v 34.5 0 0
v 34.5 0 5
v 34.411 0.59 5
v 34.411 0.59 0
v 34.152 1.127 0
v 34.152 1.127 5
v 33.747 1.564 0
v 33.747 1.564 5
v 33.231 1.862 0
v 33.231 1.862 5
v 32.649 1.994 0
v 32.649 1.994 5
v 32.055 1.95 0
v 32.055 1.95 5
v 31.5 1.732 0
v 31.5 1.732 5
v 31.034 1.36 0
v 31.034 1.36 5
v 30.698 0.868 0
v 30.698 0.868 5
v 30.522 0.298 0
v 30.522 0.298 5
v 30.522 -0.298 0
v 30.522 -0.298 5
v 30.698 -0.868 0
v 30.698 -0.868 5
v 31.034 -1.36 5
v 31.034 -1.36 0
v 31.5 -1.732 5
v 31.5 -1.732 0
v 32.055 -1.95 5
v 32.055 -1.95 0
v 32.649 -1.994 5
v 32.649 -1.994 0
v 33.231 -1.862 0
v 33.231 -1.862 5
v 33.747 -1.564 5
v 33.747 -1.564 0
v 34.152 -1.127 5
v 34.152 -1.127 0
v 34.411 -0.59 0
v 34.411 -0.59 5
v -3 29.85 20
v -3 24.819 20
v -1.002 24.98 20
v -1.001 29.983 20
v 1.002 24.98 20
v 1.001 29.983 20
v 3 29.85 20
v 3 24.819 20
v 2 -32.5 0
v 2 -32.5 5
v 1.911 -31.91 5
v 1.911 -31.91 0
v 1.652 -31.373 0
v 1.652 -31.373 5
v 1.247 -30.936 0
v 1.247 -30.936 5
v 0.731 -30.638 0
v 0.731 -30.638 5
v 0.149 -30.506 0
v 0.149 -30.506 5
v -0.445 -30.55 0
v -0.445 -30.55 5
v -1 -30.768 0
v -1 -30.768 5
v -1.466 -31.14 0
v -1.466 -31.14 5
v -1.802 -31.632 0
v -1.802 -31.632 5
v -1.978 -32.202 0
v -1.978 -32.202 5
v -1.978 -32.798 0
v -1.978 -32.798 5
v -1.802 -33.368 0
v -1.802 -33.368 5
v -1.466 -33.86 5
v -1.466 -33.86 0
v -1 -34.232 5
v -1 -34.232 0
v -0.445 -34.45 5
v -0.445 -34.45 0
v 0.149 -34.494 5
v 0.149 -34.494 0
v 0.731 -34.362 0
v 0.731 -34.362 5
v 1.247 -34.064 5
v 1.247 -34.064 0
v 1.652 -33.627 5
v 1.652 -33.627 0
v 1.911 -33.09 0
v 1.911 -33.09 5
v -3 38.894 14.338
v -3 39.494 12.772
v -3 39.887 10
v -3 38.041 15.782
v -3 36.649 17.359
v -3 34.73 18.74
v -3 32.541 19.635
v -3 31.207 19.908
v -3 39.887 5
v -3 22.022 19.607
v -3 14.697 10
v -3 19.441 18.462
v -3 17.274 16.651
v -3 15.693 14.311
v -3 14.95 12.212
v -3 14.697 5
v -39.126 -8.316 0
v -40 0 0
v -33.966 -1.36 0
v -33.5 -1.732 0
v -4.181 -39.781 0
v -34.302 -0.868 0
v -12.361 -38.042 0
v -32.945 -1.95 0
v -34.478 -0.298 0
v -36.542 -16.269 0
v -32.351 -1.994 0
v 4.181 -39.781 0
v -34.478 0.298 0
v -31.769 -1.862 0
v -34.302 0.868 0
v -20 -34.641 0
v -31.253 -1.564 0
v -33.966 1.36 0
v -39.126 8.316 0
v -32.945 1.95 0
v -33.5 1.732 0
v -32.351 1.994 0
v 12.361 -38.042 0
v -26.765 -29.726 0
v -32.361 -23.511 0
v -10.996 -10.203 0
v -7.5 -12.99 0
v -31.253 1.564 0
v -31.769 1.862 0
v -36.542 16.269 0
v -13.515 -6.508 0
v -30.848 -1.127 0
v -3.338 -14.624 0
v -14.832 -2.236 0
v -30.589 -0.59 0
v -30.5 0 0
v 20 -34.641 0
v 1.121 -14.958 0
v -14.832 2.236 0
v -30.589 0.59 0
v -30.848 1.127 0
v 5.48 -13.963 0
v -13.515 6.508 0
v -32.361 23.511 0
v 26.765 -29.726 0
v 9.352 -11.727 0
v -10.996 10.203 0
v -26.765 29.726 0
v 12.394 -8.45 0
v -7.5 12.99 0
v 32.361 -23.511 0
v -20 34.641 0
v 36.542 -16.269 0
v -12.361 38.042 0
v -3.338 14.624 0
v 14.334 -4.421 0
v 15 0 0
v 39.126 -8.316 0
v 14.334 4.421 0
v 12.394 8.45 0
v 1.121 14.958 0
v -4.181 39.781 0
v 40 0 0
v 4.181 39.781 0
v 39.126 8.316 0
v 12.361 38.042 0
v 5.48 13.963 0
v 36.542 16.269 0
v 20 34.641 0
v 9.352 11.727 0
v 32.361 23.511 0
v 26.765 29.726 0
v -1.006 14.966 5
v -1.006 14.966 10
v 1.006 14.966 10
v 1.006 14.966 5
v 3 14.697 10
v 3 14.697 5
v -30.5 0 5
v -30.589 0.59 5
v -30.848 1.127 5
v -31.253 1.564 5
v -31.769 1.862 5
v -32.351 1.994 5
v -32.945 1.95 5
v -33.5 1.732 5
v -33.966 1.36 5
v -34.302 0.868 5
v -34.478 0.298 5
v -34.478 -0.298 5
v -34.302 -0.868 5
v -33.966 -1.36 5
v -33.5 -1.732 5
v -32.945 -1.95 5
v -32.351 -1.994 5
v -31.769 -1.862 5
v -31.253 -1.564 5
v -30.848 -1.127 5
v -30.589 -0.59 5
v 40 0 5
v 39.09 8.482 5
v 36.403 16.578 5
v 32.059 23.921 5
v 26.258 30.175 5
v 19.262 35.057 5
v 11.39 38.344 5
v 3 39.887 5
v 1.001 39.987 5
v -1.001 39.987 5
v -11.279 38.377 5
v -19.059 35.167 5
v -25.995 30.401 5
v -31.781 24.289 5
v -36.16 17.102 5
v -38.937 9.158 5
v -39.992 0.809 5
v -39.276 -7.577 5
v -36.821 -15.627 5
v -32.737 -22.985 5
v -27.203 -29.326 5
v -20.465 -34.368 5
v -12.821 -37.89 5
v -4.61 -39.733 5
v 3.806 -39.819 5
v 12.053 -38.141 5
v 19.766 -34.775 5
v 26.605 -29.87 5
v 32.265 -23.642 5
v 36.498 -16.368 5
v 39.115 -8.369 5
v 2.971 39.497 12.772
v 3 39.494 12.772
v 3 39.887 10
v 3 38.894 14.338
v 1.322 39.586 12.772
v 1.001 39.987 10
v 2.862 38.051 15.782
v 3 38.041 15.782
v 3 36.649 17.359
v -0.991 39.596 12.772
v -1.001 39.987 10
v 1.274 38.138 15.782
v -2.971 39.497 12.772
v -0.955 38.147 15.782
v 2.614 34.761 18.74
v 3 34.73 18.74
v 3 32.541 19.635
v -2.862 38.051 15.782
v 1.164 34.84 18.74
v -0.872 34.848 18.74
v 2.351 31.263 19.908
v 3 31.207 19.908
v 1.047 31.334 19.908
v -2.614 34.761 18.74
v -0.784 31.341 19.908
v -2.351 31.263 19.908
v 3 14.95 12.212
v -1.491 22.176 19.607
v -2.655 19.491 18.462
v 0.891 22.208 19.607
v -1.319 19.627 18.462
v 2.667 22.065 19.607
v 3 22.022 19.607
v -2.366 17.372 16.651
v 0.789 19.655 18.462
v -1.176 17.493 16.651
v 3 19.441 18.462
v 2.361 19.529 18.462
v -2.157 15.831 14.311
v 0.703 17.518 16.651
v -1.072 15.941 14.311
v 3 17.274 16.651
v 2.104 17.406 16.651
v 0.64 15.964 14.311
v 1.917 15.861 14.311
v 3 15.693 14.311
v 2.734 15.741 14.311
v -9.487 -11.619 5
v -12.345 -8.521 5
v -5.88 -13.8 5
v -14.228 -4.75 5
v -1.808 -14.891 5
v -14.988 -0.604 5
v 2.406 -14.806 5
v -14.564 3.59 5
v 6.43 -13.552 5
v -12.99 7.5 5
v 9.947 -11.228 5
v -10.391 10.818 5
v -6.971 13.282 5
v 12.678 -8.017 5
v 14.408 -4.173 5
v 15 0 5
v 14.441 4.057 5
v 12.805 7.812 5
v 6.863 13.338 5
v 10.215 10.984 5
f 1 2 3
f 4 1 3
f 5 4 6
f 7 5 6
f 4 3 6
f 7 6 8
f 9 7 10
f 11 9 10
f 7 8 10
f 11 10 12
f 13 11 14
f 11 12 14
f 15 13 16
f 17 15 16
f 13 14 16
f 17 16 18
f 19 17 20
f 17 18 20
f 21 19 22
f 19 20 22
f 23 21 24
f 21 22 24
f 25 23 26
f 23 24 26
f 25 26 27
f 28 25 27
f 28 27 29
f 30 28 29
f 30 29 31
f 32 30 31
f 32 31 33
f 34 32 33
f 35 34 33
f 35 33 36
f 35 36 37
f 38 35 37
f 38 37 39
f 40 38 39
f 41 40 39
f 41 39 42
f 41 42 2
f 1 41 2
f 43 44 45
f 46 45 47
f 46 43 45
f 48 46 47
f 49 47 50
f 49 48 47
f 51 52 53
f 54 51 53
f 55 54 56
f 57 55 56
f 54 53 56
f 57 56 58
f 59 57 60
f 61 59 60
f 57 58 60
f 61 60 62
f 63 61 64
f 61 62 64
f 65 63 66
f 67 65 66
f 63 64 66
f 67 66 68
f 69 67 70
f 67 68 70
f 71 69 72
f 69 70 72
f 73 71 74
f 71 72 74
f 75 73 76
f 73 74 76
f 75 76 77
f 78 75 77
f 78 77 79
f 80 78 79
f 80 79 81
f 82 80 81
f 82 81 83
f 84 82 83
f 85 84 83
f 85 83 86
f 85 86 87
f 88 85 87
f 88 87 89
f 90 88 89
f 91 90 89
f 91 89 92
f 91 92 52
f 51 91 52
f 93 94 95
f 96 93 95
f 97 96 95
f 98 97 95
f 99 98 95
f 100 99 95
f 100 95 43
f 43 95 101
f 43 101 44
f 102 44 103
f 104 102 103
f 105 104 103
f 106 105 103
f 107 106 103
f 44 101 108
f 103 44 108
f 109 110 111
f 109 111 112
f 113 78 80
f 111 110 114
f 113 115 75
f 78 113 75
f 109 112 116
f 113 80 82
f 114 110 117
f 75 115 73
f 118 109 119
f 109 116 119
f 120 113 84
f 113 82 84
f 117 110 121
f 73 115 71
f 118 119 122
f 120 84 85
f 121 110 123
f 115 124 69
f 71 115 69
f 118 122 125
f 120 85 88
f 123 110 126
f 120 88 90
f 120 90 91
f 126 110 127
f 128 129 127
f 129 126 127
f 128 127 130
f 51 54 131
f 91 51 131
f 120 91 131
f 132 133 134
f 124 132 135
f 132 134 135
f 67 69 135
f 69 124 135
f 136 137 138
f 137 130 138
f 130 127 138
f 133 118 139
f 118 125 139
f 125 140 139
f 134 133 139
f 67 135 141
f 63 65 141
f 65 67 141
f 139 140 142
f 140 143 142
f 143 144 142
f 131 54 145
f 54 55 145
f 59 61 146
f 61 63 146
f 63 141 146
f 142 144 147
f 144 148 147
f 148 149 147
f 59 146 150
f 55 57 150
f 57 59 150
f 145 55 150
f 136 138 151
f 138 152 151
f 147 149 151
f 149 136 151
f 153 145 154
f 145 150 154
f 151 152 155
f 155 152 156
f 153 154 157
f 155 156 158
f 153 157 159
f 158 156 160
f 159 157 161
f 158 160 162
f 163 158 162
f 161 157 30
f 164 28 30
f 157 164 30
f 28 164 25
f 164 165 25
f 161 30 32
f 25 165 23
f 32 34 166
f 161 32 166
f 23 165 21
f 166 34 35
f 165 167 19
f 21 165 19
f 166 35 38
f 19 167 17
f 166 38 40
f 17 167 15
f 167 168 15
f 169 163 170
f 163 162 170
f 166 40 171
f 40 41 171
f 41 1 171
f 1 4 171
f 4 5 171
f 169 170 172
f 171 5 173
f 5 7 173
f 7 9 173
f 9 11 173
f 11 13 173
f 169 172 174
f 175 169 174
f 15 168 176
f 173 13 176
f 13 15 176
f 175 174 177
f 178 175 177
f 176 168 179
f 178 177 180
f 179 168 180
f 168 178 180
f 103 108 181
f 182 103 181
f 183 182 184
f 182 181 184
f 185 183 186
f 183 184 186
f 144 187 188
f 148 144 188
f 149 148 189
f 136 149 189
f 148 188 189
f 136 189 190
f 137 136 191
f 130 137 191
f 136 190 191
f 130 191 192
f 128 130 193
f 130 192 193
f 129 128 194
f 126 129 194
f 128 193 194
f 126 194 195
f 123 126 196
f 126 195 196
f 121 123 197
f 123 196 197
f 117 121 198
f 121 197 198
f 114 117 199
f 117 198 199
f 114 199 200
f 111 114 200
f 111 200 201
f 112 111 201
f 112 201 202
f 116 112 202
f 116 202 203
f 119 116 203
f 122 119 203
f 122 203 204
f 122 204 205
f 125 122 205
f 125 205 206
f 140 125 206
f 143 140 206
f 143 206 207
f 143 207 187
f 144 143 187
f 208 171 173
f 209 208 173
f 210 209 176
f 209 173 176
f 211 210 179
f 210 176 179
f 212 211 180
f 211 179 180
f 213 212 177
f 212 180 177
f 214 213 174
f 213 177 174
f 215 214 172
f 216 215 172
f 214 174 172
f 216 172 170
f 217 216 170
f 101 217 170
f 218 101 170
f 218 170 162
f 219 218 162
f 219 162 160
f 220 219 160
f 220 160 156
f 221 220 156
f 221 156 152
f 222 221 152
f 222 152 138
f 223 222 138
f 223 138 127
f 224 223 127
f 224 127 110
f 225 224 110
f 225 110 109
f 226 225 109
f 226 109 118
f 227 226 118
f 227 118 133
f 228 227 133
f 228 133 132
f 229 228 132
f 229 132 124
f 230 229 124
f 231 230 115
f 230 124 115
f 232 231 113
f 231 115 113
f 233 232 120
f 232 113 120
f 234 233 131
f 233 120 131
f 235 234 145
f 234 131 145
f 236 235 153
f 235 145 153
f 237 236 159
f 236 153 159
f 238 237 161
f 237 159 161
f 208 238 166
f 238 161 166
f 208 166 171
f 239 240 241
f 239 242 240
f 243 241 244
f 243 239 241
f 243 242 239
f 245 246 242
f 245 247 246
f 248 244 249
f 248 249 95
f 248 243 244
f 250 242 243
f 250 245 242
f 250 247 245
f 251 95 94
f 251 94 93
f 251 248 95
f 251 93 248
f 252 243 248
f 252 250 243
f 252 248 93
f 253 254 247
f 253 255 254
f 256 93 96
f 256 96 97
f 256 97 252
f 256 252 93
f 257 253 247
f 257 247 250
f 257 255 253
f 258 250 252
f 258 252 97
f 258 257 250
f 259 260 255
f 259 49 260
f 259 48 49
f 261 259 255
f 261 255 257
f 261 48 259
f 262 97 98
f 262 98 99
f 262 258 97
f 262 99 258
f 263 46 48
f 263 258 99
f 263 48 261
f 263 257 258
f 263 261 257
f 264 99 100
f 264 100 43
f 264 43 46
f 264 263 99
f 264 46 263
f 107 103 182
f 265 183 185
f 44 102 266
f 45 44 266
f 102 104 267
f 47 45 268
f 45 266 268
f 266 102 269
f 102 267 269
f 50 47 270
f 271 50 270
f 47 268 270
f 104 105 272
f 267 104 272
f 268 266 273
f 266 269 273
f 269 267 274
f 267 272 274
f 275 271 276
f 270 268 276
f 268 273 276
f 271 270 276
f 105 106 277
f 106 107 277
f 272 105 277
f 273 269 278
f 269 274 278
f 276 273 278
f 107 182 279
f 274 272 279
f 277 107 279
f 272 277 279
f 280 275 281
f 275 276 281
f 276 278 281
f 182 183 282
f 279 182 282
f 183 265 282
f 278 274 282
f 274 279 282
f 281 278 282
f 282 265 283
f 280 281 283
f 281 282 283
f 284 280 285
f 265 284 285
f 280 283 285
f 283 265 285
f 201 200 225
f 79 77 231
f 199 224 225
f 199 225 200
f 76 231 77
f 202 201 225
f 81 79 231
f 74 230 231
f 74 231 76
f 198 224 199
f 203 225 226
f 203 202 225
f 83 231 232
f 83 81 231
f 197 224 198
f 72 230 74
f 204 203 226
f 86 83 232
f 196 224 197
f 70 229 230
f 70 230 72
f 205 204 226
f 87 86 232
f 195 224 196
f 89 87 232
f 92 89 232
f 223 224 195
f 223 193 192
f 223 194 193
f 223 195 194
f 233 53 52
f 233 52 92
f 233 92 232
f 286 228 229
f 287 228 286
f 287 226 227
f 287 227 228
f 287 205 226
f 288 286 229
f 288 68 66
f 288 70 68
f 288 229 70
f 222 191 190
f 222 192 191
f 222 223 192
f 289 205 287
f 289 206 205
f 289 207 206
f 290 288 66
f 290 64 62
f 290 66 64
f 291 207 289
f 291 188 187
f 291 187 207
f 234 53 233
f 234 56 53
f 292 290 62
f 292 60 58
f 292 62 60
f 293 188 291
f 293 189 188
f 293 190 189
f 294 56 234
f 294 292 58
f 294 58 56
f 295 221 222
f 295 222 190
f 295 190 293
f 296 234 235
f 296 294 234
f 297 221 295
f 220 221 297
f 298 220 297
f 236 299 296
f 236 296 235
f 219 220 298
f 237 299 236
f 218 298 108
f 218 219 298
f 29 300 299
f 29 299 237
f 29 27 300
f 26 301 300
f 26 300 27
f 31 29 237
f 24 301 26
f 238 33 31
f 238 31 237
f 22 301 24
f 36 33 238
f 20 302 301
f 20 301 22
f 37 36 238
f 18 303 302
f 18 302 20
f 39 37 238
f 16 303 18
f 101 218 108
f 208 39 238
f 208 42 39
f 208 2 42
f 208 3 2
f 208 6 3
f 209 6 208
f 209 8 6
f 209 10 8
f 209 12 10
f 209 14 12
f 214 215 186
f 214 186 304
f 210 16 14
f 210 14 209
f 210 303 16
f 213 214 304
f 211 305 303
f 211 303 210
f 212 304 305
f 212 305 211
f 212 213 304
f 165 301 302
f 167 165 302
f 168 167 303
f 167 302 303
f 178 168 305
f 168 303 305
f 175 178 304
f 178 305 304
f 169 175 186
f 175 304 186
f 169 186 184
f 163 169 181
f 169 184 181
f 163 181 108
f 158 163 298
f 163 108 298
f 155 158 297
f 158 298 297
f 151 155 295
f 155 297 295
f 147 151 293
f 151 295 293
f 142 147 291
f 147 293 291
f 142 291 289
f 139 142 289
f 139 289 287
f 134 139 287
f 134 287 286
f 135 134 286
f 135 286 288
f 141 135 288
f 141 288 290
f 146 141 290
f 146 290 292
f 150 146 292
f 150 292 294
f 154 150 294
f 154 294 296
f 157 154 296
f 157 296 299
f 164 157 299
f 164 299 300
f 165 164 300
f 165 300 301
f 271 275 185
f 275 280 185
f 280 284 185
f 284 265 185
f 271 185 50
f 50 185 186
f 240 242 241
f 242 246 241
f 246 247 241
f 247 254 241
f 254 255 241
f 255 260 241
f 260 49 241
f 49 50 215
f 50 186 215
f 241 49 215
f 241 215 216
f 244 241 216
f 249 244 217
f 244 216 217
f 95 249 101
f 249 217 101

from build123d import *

# Parameters (mm, degrees)
SKETCH_1_R          = 40
EXTRUDE_1_DEPTH     = 5
SKETCH_3_R          = 15
CUT_EXTRUDE_1_DEPTH = 10
SKETCH_4_R          = 2
CUT_EXTRUDE_2_DEPTH = 10
EXTRUDE_2_DEPTH     = 15
FILLET_1_R          = 10


with BuildPart() as part:
    # 草图1 → 凸台-拉伸1 (new body)
    with BuildSketch(Plane.XY):
        Circle(SKETCH_1_R)
    extrude(amount=EXTRUDE_1_DEPTH)

    # 草图3 → 切除-拉伸1 (cut)
    with BuildSketch(Plane.XY.offset(5)):
        Circle(SKETCH_3_R)
    extrude(amount=-CUT_EXTRUDE_1_DEPTH, mode=Mode.SUBTRACT)

    # 草图4 → 切除-拉伸2 (cut)
    with BuildSketch(Plane.XY.offset(5)):
        with Locations((0, -32.5)):
            Circle(SKETCH_4_R)
        with Locations((32.5, 0)):
            Circle(SKETCH_4_R)
        with Locations((-32.5, 0)):
            Circle(SKETCH_4_R)
    extrude(amount=-CUT_EXTRUDE_2_DEPTH, mode=Mode.SUBTRACT)

    # 草图5 → 凸台-拉伸2 (add)
    with BuildSketch(Plane.XY.offset(5)):
        with BuildLine():
            Line((-3, 39.88734135), (-3, 14.696938457))
            ThreePointArc((-3, 14.696938457), (0, 15), (3, 14.696938457))
            Line((3, 14.696938457), (3, 39.88734135))
            ThreePointArc((3, 39.88734135), (0, 40), (-3, 39.88734135))
        make_face()
    extrude(amount=EXTRUDE_2_DEPTH)

    # 圆角1
    fillet_1_edges = [part.edges().sort_by_distance(p)[0] for p in [
        (0, 40, 20),
        (0, 15, 20),
    ]]
    fillet(fillet_1_edges, radius=FILLET_1_R)


solid = part.part
